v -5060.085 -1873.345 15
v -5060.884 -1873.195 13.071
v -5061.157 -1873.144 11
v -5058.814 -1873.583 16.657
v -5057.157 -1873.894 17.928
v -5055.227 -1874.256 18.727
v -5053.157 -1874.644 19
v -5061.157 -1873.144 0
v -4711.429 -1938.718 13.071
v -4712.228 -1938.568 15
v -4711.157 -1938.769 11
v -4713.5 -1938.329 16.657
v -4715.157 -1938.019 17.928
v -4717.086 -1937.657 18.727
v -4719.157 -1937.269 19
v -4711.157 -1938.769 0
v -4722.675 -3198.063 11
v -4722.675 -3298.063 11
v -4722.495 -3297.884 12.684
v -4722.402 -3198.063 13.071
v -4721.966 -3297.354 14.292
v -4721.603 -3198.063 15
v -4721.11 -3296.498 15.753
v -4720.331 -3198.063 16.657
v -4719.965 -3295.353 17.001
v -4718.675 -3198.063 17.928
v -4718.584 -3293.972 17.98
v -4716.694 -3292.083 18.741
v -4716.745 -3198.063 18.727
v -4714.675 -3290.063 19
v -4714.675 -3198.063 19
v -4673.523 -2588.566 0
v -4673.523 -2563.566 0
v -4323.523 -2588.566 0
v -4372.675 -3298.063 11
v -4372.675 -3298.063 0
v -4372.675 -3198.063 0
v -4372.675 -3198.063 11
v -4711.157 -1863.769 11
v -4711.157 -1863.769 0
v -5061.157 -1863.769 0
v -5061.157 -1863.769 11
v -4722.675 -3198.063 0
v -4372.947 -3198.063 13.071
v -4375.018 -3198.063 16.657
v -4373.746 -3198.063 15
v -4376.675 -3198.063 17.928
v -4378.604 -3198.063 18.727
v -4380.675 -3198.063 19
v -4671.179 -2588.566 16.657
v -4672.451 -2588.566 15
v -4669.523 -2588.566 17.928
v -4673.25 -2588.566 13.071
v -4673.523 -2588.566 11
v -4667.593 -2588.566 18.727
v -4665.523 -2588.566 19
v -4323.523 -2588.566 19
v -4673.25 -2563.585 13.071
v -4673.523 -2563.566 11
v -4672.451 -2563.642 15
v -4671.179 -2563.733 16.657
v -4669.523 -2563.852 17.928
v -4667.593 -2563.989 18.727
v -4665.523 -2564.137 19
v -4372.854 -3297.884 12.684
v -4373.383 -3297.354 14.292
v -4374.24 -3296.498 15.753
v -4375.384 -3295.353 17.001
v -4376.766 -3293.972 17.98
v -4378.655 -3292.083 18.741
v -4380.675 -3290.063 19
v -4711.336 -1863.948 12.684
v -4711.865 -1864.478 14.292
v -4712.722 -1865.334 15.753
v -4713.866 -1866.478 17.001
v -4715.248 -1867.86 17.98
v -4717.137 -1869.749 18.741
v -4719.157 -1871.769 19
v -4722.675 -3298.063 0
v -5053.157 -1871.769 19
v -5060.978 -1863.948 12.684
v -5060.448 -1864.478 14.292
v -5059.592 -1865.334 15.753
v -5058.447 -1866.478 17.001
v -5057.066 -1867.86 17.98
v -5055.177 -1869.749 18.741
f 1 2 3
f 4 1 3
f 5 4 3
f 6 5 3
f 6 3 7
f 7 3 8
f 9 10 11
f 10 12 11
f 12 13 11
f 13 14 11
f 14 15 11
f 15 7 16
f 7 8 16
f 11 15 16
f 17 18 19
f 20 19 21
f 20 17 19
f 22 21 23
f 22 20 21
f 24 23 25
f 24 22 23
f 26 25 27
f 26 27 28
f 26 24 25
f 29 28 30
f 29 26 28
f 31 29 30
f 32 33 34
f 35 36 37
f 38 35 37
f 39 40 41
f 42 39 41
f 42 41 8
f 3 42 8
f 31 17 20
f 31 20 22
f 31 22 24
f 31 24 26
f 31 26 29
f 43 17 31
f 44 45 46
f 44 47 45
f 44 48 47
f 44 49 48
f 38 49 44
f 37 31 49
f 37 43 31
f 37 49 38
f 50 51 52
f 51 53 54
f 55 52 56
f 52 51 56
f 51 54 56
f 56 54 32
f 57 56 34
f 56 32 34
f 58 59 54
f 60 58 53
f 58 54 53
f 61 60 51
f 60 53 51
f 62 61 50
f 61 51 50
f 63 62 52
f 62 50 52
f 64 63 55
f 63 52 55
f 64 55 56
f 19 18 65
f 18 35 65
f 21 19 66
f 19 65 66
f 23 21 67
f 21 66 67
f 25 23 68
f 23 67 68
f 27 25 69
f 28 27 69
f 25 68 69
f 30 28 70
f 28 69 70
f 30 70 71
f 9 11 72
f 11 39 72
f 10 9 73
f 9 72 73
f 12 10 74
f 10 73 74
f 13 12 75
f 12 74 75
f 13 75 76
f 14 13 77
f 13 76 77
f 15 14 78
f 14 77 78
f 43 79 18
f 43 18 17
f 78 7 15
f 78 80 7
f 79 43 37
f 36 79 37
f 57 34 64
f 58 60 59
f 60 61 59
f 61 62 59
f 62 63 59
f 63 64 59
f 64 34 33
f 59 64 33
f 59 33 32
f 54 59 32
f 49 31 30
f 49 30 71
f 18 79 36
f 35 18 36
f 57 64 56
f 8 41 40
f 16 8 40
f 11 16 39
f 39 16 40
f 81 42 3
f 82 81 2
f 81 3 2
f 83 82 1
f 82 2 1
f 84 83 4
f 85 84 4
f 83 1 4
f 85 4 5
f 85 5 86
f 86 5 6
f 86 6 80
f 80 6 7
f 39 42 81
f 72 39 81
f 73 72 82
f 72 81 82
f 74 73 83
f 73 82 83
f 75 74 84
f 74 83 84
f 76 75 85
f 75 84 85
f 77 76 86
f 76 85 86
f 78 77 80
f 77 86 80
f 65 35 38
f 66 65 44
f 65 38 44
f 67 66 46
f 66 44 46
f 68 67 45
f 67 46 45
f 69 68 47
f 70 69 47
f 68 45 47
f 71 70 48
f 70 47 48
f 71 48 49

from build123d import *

# Parameters (mm, degrees)
F0_W     = 350
F0_H     = 100
F3_DEPTH = 19
F4_DEPTH = 19
F5_DEPTH = 19
F6_R     = 8
F6_2_R   = 8
F6_3_R   = 8


# Not quite as in the source:
# - a feature names something its author has since deleted; it is built from what else it names


with BuildPart() as f3:
    # F0 (on Top) → F3 (new body)
    with BuildSketch(Plane.XY):
        with Locations((-4547.6745605469, -3248.0629263303)):
            Rectangle(F0_W, F0_H)
    extrude(amount=F3_DEPTH)

    # F6#3
    f6_3_edges = [f3.edges().sort_by_distance(p)[0] for p in [
        (-4722.674561, -3248.062926, 19),
        (-4372.674561, -3248.062926, 19),
        (-4547.674561, -3298.062926, 19),
    ]]
    fillet(f6_3_edges, radius=F6_3_R)


with BuildPart() as f4:
    # F1 (on Top) → F4 (new body)
    with BuildSketch(Plane.XY):
        Polygon((-4711.1567020416, -1863.7687733282), (-5061.1567020416, -1863.7687733282), (-5061.1567020416, -1873.1437733282), (-4711.1567020416, -1938.7687733282), align=None)
    extrude(amount=F4_DEPTH)

    # F6
    f6_edges = [f4.edges().sort_by_distance(p)[0] for p in [
        (-5061.156702, -1868.456273, 19),
        (-4886.156702, -1863.768773, 19),
        (-4711.156702, -1901.268773, 19),
    ]]
    fillet(f6_edges, radius=F6_R)


with BuildPart() as f5:
    # F2 (on Top) → F5 (new body)
    with BuildSketch(Plane.XY):
        Polygon((-4673.5225359599, -2563.5657919492), (-4673.5225359599, -2588.5657919492), (-4323.5225359599, -2588.5657919492), align=None)
    extrude(amount=F5_DEPTH)

    # F6#2
    f6_2_edges = [f5.edges().sort_by_distance(p)[0] for p in [
        (-4673.522536, -2576.065792, 19),
    ]]
    fillet(f6_2_edges, radius=F6_2_R)


solid = Compound([f3.part, f4.part, f5.part])
